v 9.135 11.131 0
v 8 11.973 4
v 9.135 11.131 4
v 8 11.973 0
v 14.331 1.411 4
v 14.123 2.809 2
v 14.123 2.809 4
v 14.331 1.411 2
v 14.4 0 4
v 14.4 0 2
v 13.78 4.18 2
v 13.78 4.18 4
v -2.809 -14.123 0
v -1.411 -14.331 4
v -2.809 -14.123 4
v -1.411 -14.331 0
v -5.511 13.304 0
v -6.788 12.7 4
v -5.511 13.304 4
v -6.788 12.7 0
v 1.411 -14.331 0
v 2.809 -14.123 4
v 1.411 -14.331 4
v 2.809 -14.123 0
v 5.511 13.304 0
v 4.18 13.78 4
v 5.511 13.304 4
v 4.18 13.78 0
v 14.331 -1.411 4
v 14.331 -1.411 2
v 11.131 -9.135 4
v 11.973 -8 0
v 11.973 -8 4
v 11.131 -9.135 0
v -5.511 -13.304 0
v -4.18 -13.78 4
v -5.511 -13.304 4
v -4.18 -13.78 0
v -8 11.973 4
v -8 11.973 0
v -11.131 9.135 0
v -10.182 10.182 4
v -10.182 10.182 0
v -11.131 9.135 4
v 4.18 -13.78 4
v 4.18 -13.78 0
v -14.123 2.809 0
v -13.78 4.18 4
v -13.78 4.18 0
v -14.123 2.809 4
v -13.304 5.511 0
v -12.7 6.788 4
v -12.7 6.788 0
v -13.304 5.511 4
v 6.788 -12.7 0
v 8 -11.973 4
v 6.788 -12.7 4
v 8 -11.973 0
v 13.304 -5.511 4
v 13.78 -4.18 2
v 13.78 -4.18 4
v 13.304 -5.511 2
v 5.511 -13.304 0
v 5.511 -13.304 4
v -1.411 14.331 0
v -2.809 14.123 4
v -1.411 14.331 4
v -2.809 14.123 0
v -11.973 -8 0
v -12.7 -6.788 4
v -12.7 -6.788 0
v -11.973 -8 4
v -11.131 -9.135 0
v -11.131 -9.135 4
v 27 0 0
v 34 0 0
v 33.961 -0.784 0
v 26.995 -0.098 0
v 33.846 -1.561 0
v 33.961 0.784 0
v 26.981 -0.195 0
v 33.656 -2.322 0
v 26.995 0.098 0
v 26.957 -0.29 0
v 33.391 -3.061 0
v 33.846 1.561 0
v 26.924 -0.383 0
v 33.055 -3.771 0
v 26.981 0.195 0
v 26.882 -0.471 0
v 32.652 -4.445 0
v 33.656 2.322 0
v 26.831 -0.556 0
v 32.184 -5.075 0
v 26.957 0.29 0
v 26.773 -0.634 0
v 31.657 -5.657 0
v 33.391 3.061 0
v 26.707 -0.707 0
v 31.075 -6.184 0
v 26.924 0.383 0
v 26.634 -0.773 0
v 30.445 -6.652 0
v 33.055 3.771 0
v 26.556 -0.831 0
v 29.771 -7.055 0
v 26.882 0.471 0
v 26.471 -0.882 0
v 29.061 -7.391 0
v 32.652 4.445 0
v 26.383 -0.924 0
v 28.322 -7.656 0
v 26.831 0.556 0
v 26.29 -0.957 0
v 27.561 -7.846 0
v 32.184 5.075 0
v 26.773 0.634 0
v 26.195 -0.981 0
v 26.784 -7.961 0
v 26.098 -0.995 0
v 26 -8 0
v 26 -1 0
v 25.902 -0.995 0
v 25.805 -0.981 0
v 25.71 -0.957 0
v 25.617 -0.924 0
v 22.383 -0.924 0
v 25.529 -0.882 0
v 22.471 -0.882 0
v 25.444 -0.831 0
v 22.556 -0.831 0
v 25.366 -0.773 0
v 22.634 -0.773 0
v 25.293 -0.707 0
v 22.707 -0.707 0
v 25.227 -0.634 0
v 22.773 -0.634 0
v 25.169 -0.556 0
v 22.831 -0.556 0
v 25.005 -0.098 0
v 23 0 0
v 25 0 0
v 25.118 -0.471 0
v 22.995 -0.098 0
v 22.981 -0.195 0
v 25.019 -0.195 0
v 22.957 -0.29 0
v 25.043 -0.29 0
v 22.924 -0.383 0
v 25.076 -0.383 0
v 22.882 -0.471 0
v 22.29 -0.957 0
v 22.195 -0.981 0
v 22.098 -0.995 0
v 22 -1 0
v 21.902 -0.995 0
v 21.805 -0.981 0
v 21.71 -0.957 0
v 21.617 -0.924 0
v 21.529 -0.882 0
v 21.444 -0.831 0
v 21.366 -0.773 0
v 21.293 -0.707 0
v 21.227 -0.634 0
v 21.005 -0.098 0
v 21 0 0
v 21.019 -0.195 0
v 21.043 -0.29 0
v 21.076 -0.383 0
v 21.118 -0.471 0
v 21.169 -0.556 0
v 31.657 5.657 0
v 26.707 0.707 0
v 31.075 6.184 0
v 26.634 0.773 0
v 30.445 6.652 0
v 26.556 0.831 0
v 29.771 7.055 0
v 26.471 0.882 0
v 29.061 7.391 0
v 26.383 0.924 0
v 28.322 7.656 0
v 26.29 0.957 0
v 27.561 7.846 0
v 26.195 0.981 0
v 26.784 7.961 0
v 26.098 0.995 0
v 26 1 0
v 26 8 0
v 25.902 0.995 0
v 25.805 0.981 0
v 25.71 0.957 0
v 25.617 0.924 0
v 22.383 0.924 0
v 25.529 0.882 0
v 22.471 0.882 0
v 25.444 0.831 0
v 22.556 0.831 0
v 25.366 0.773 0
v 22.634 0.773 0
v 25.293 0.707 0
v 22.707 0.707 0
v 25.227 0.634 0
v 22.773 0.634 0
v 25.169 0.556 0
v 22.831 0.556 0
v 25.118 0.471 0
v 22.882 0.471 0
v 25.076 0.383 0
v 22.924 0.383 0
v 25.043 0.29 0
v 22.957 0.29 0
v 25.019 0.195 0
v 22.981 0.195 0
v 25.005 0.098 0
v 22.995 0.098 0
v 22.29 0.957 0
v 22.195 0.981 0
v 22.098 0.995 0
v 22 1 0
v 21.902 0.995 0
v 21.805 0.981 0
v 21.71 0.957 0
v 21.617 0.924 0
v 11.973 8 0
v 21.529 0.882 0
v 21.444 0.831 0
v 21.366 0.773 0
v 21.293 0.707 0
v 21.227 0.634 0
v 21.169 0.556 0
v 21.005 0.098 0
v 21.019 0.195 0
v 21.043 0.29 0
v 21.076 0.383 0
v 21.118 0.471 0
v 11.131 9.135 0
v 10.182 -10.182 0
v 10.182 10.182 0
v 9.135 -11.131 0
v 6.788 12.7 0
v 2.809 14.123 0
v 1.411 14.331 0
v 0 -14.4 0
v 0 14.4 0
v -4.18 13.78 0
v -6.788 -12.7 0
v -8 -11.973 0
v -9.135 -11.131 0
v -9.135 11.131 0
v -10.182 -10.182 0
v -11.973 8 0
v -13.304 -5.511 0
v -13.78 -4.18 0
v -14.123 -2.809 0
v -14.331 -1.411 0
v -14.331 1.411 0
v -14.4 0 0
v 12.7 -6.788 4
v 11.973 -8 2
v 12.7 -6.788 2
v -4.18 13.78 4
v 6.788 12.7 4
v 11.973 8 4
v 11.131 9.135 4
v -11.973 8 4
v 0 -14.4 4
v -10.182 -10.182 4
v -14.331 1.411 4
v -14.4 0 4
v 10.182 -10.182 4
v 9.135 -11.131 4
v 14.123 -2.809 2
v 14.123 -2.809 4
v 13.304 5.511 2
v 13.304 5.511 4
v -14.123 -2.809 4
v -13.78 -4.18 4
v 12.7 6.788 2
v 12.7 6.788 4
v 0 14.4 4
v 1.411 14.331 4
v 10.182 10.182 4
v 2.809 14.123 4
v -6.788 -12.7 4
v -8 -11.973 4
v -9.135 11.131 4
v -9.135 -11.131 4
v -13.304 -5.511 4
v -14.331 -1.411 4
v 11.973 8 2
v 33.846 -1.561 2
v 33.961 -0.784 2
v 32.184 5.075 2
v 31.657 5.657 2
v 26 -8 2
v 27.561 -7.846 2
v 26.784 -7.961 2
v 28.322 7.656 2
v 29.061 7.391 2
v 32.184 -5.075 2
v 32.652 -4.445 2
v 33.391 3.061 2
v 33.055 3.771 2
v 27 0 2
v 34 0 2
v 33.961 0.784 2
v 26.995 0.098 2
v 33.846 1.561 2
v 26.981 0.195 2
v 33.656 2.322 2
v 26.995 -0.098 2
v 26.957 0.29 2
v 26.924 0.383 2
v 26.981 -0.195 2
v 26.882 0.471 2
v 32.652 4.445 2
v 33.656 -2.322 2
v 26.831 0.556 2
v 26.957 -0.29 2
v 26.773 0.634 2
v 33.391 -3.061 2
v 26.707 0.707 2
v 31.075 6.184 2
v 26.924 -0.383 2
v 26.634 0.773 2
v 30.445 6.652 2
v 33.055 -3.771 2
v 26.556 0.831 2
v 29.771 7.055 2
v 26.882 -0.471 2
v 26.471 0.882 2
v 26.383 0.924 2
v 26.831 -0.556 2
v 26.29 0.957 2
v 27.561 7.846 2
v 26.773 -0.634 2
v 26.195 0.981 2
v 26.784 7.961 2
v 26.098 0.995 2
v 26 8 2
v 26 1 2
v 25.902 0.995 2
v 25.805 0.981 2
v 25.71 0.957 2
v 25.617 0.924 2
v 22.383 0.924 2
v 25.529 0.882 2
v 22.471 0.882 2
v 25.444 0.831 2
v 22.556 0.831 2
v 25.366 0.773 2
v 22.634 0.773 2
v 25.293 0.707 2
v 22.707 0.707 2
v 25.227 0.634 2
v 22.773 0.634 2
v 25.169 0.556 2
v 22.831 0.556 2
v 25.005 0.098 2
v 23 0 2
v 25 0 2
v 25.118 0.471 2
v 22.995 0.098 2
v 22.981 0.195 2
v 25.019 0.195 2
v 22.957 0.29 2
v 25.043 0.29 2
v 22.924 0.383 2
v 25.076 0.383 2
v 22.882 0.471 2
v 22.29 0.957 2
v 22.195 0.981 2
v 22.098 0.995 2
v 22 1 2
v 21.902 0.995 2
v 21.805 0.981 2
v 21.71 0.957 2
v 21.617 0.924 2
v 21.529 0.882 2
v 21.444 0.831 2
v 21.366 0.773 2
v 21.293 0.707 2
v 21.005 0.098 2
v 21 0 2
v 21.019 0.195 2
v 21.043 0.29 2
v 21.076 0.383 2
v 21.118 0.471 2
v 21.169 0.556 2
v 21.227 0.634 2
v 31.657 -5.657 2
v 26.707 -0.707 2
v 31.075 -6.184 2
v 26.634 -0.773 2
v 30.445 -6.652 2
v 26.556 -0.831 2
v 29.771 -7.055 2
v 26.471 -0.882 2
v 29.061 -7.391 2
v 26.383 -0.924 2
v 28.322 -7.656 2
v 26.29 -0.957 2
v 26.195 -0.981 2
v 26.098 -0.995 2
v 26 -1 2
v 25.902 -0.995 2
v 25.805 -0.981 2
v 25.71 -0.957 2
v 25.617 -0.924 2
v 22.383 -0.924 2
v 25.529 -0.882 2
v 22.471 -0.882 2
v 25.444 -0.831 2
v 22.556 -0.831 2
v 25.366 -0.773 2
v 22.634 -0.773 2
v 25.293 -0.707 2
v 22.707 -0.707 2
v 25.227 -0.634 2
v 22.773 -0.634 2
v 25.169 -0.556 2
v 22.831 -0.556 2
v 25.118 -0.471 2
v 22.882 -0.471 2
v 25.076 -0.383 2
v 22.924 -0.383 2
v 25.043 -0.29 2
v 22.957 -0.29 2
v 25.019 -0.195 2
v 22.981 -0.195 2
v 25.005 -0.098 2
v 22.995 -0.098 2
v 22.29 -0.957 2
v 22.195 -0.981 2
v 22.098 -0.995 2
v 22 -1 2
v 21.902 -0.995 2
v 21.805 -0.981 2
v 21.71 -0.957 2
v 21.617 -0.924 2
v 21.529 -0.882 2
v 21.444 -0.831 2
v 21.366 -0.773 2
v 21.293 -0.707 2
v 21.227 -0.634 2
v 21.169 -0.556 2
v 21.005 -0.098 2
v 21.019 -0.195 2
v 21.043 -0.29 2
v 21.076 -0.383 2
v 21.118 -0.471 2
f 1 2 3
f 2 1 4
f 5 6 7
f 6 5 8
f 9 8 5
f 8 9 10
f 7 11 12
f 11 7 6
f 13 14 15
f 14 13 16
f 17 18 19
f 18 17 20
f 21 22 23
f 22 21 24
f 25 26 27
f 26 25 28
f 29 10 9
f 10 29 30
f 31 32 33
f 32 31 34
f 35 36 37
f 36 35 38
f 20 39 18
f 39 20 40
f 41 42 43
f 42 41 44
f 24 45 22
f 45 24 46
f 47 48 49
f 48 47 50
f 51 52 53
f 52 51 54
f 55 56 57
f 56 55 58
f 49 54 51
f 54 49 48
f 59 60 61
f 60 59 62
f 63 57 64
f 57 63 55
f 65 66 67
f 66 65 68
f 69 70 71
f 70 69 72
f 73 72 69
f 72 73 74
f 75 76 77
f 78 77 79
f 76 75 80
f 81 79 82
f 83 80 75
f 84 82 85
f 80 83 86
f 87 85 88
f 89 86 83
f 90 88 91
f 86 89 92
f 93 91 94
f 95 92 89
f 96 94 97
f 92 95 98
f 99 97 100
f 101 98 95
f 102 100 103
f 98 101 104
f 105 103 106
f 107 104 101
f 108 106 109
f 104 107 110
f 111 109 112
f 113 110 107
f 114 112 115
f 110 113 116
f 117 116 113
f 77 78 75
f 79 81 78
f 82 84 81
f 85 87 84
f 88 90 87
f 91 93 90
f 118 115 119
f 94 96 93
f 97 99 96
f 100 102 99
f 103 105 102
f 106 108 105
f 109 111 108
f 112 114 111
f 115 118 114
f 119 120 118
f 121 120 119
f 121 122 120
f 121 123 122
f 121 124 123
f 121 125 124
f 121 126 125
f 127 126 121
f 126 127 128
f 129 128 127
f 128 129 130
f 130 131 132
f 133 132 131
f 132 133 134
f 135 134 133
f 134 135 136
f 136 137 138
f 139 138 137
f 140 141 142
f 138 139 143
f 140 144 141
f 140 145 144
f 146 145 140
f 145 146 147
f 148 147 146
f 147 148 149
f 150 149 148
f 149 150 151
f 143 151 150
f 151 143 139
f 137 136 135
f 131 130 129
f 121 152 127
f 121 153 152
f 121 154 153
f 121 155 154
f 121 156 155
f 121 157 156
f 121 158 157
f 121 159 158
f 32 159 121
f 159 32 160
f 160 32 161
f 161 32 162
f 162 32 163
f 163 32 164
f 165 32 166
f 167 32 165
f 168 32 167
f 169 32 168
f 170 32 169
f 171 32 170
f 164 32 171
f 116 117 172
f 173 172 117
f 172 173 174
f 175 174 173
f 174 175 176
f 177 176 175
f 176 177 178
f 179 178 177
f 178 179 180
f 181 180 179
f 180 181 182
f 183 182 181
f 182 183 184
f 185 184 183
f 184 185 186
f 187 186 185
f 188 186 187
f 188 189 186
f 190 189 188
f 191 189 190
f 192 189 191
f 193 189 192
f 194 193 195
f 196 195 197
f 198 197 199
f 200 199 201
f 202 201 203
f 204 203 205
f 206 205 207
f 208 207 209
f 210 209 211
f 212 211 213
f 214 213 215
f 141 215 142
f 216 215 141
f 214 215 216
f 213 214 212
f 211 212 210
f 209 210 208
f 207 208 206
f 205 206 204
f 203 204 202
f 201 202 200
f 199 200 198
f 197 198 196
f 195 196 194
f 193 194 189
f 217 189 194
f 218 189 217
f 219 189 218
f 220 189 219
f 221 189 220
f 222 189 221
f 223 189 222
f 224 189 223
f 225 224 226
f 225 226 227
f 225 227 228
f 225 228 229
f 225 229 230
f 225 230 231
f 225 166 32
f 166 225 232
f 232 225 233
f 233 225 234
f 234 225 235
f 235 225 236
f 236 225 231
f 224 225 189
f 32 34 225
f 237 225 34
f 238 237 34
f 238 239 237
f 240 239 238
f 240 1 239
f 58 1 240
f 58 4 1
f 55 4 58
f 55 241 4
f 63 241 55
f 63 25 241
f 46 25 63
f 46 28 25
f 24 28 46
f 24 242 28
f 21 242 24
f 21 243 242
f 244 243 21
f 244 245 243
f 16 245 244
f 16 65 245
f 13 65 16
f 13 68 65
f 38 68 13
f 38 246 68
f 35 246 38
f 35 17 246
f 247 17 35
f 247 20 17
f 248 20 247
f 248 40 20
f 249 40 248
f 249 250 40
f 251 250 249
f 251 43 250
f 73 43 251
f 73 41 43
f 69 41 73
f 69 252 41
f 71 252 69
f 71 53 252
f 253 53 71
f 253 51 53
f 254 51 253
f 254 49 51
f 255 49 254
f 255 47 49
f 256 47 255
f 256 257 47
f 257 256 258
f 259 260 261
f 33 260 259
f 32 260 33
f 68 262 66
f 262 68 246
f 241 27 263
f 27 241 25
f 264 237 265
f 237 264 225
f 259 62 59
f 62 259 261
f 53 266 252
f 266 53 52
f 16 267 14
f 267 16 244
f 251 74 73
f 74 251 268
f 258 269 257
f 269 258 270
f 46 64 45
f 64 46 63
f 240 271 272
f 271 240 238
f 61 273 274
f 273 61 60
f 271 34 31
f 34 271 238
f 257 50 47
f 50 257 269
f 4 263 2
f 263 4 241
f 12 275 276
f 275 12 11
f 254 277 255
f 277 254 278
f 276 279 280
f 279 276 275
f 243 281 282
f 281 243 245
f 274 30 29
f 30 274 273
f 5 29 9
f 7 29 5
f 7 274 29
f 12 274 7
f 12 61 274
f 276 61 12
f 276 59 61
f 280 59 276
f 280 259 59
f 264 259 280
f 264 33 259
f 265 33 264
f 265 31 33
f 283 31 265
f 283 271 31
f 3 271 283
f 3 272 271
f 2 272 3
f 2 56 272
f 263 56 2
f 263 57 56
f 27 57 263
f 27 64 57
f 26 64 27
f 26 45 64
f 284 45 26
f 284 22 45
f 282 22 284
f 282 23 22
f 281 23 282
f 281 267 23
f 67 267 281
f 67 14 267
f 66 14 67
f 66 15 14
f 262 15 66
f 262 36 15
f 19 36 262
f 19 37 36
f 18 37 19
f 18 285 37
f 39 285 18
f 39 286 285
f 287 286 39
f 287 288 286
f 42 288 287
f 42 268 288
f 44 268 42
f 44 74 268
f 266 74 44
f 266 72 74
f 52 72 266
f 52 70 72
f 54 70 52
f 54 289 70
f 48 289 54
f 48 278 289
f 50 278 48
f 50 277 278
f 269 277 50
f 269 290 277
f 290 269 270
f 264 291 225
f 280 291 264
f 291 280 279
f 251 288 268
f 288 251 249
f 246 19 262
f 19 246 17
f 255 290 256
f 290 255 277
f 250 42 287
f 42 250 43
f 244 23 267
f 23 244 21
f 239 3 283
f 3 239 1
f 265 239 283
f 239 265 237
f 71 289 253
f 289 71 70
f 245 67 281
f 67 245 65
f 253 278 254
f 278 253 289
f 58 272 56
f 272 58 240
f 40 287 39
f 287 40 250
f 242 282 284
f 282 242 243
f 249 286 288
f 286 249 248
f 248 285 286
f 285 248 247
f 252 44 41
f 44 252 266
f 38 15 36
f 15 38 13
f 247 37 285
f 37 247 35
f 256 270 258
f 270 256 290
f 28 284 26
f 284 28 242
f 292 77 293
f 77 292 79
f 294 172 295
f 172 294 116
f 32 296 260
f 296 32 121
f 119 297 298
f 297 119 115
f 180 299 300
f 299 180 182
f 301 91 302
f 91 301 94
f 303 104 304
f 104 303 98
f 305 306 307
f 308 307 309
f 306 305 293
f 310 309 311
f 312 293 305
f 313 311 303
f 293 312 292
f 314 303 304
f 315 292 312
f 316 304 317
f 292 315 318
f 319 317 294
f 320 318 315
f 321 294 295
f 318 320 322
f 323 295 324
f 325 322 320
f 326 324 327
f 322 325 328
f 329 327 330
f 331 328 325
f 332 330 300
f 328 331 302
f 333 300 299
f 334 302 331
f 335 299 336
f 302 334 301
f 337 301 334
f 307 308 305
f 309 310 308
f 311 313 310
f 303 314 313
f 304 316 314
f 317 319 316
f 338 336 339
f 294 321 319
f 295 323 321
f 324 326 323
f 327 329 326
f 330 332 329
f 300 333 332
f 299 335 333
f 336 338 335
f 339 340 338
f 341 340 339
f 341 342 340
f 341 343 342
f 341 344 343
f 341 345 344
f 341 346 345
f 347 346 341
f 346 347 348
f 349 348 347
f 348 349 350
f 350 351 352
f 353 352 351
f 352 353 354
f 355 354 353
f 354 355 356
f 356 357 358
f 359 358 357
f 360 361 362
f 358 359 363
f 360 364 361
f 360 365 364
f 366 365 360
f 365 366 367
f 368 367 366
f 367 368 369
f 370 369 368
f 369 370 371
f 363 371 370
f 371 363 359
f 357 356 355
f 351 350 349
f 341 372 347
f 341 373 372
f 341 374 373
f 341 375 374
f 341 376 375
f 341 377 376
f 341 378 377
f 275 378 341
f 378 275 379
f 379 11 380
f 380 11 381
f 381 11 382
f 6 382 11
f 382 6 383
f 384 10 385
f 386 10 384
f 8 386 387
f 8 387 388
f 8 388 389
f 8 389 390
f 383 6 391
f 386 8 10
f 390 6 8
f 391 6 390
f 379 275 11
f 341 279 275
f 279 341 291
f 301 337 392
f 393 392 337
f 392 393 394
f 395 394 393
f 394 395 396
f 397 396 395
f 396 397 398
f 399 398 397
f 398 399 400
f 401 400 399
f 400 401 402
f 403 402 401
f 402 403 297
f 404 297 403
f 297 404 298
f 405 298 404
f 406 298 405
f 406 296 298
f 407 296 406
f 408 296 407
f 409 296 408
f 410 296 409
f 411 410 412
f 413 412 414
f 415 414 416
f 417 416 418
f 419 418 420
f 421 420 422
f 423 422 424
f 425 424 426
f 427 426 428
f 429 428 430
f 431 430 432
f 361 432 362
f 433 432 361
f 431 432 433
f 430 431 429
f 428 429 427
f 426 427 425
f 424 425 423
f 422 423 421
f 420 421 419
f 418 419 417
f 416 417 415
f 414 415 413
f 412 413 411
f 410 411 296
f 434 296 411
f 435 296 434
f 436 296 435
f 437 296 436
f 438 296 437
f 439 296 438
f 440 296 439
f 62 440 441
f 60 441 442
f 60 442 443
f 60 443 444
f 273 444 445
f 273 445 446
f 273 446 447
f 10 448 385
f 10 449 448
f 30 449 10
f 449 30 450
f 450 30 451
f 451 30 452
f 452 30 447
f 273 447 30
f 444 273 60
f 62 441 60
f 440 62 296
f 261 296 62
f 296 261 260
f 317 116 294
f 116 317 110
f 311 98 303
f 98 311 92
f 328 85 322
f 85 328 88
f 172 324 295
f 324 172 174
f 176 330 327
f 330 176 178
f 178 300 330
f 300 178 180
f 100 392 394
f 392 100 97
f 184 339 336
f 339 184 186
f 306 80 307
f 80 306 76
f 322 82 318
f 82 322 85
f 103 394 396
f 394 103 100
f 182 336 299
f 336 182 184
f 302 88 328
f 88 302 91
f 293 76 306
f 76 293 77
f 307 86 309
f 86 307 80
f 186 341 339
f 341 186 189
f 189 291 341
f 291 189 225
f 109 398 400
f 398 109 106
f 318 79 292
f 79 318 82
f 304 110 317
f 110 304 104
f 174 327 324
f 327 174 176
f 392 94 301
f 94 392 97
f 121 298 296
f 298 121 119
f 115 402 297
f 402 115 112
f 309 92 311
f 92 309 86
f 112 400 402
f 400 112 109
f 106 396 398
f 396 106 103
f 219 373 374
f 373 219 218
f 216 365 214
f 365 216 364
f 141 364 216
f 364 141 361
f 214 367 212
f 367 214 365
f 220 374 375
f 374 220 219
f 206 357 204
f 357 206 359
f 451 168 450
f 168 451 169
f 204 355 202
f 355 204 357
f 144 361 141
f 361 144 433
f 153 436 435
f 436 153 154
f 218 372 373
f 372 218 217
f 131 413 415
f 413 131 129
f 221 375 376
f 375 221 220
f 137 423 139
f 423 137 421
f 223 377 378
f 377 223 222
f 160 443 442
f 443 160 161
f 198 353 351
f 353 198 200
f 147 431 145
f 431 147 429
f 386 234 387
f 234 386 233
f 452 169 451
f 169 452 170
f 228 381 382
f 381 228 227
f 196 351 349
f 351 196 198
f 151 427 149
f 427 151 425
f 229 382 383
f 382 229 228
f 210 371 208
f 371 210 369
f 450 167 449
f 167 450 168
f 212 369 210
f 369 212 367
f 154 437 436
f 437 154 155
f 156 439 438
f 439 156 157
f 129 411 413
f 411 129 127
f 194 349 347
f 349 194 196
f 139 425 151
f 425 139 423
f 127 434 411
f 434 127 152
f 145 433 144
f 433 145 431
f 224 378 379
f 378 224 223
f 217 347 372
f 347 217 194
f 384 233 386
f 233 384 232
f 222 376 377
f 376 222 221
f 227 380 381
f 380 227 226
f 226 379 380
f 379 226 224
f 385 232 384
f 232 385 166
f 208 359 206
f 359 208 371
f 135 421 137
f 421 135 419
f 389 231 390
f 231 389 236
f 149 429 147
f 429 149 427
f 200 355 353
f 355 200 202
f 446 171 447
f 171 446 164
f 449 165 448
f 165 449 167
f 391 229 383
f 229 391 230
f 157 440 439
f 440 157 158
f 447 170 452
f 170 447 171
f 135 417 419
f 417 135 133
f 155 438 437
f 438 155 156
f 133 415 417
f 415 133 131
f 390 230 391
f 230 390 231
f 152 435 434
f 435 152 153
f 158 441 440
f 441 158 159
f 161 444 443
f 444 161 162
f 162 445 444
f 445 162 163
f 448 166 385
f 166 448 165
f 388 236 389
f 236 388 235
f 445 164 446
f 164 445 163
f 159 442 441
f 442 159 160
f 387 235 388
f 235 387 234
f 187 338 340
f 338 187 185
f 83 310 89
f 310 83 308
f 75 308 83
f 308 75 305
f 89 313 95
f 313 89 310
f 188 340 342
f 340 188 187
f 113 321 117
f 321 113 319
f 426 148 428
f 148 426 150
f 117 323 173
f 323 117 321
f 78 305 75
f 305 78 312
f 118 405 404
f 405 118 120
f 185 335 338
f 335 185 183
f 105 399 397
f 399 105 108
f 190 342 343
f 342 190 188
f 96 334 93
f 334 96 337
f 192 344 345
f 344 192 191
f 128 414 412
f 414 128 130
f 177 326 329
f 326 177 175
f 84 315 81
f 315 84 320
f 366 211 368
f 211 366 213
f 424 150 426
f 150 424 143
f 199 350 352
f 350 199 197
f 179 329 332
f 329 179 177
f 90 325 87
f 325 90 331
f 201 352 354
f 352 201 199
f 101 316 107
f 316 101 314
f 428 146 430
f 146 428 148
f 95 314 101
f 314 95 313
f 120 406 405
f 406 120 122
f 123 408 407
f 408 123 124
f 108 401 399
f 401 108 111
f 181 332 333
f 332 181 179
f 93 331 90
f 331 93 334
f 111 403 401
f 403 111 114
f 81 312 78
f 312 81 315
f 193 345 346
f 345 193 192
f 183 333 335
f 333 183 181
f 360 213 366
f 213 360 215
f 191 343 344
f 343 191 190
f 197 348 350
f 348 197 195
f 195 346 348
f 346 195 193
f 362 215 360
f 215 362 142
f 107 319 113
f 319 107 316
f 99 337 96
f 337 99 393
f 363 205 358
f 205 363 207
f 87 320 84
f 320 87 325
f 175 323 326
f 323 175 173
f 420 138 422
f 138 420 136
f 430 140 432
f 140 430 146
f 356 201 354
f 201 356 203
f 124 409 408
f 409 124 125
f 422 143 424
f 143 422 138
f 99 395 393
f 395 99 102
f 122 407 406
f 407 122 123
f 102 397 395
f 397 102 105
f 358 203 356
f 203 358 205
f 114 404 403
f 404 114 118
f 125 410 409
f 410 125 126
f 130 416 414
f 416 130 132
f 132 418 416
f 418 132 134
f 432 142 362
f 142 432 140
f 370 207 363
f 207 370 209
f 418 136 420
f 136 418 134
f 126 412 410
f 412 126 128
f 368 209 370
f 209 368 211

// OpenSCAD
// Box to house the controller on the side of the kettle


//%kettle_shape();
controller_case();
display_inner_plate();
display_outer_plate();
/* translate([0,4,3]) kettle_wire_clamp();
translate([0,7.5]) wemos_mount_clip(); */
the_ring_of_power();
!drill_template();
module the_ring_of_power(){
    $fn=64;
    FR = 28-1+4;
    difference() {
        union(){
            //cylinder(d=60-11+2,h=1,center=true);
            cylinder(d=68,h=1,center=true);
            /* for(i=[0:3]) rotate([0,0,360*i/3]) hull() for(j=[0:1])
                translate([FR*j,0]) cylinder(d=6,h=1,center=true); */
        }
        cylinder(d=34,h=2,center=true);

        for(i=[0:3]) rotate([0,0,360*i/3]) translate([FR,0]) cylinder(d=2.8,h=2,center=true);

        translate([0,0,0.3]){
            //cylinder(r=17+1,h=1);
            difference() {
                R=21-1;
                W=0.6;
                cylinder(r=R+.5*W,h=1);
                cylinder(r=R-.5*W,h=3,center=true);
            }
            difference() {
                R=21+3;
                W=0.6;
                cylinder(r=R+.5*W,h=1);
                cylinder(r=R-.5*W,h=3,center=true);
            }
            difference() {
                R=25.1+3;
                W=0.7;
                cylinder(r=R+.5*W,h=1);
                cylinder(r=R-.5*W,h=3,center=true);
            }
        }
    }
}

module drill_template(){
    $fn=64;
    difference() {
        union(){
            cylinder(d=28.8,h=4);
            hull() for(i=[0:1]) translate([26*i,0]) cylinder(d=16,h=2);
        }
        translate([22,0]) cylinder(d=2,h=5,center=true);
        translate([26,0]) cylinder(d=2,h=5,center=true);
    }
}

module kettle_shape(){
    cylinder(d1=157.5,d2=132+10*0,h=224,$fn=128);
    translate([0,0,29]) rotate([90,0]) cylinder(d=27,h=80);
    hull() for(i=[-.5:1:.5]) translate([50*i,0,29])
        rotate([90,0]) cylinder(d=11,h=80);
}

module controller_case(){
    $fn=32;
    difference(){
        union(){
            difference(){
                /* hull() for(i=[-.5:1:.5],j=[0:1]) translate([60*i,-58,8+60*j])
                    rotate([90,0]) cylinder(d=16,h=38); */
                hull() for(i=[-.5:1:.5],j=[0:1]) translate([(60+5*0)*i,-58,8+60*j])
                    rotate([90,0]) cylinder(d=16,h=38);
                translate([0,0,-1]) kettle_shape();
                hull() for(i=[-.5:1:.5],j=[0:1]) translate([60*i,-58,8+60*j])
                    rotate([90,0]) cylinder(d=16-4,h=22+16-2+10*0);
            }

            // display screw nub
            for(i=[-.5:1:.5]) translate([0,-96+1,62+17*i])
                rotate([-90,0]) cylinder(d=6,h=2.75);
            hull() for(i=[-.5:1:.5],j=[-.5:1:.5]) translate([(38.5-.2)*i+1,-58-36,62+(13-.2)*j])
                rotate([-90,0]) cylinder(r=3,h=1.75);
            // wemos screw nubs
            color([.4,.4,.8]) hull() for(j=[-.5:1:.5],i=[-.5:1:.5]) translate([-14+38*j,-96+2,26-1+(36+6)*i])
                rotate([-90,0]) cylinder(d=6,h=4+1+2*0);
            // touch sensor nubs
            color([.4,.4,.8]) for(i=[-.5:1:.5]) translate([23,-96+1,40+20*i])
                rotate([-90,0]) cylinder(d=6,h=4-1.9);
            hull() for(i=[-.5:1:.5],j=[-.5:1:.5]) translate([20.5*i+23,-58-36,40+13*j])
                rotate([-90,0]) cylinder(r=4,h=2-1);
            // kettle connector nubs
            color([.4,.4,.8]) for(i=[-.5:1:.5])hull() for(j=[-.5:1:.5]) translate([23+18*i,-96+1,18+10*j])
                rotate([-90,0]) cylinder(d=6,h=4);
            color([.4,.4,.8]) hull() for(i=[-.5:1:.5],j=[-.5:1:.5]) translate([23-3+(18+10)*i,-96+1,18+10*j])
                rotate([-90,0]) cylinder(d=6,h=2.75);
        }


        color([.6,.2,.9]) translate([0,0,62]){ // OLED
            hull() for(i=[-.5:1:.5],j=[-.5:1:.5]) translate([(26-1)*i,-58,(10-1)*j+.2])
                rotate([90,0]) cylinder(d=1,h=22+16+1);
            hull() for(i=[-.5:1:.5],j=[-.5:1:.5]) translate([(38.5-.2)*i+1,-58,(13-.7)*j])
                rotate([90,0]) cylinder(d=.2,h=22+16-1);
        }

        color([.6,.2,.9]) translate([-14,-3+2,26]){ // WEMOS-32
            /* hull() for(i=[-.5:1:.5],j=[-.5:1:.5]) translate([(26-1)*i,-58,(10-1)*j])
                rotate([90,0]) cylinder(d=1,h=22+16+1); */
            hull() for(i=[-.5:1:.5],j=[-.5:1:.5]) translate([(32-2)*i,-58,(40-2)*j])
                rotate([90,0]) cylinder(d=2,h=22+16-4);

            hull() for(i=[-.5:1:.5],j=[-.5:1:.5]) translate([(11-1)*i,-58-32+(7-1)*j,-8]) //USB
                rotate([180,0]) cylinder(d=1,h=22+16+1);
        }

        color([.6,.2,.9]) translate([23,0,40]){ // touch sensor
            hull() for(i=[-.5:1:.5],j=[-.5:1:.5]) translate([20.5*i,-58-1.1,13*j])
                rotate([90,0]) cylinder(r=.4,h=22+16-2);
        }

        translate([21,-38-58,40]){
            difference(){ // touch sensor panel button
                hull() for(i=[-.5:1:.5],j=[-.5:1:.5]) translate([10*i,0,10*j])
                    rotate([90,0]) cylinder(r=3.2,h=1,center=true);
                hull() for(i=[-.5:1:.5],j=[-.5:1:.5]) translate([10*i,0,10*j])
                    rotate([90,0]) cylinder(r=2.4,h=2,center=true);
            }
            /* translate([0,0,0]) rotate([90,0]) linear_extrude(height=1,center=true)
                text("Run", size=6, font="Tlwg Typo:style=Bold", halign="center", valign="center",
                    spacing=1.0); */
            hull() for(i=[0:1]) translate([0,0,6*i])
                rotate([90,0]) cylinder(d=1.2,h=1,center=true);

            rotate([90,0]) difference(){
                R = 6;
                lw = 1.2;
                cylinder(r=R,h=1,center=true);
                cylinder(r=R-lw,h=1,center=true);
                hull() for(i=[-.5:1:.5]) translate([0,3*i+R-lw])
                    cylinder(d=3,h=1,center=true);
            }
        }

        fd = 1.8; // fastener diameter
        // display screw nub
        color([.4,.4,.8]) for(i=[-.5:1:.5]) translate([0,-96+1,62+17*i])
            rotate([-90,0]) cylinder(d=fd,h=5);
        // wemos screw nubs
        #color([.4,.4,.8]) for(i=[-.5:1:.5],j=[-.5:1:.5]) translate([-14+38*j,-96+1,26+36*i])
            rotate([-90,0]) cylinder(d=fd,h=5+2*0+5);
        // touch sensor nubs
        color([.4,.4,.8]) for(i=[-.5:1:.5]) translate([23,-96+1,40+20*i])
            rotate([-90,0]) cylinder(d=fd,h=5);
        // touch sensor nubs
        color([.4,.4,.8]) for(i=[-.5:1:.5],j=[-.5:1:.5]) translate([23+18*i,-96+1,18+10*j])
            rotate([-90,0]) cylinder(d=fd,h=5);

        translate([0,-59.25]) rotate([atan(0.5*((132-157.5+8)/132)),0]) cube([200,20,200],center=true);

        // self-tapping M2.3x8mm screws:
        translate([0,-74]) rotate([atan(0.5*((132-157.5+8)/132)),0]) for(i=[-.5:1:.5],j=[0:2]) translate([70*i,0,10+27*j]){
            rotate([0,90,15*i]) cylinder(d=2.35,h=16,center=true);
            rotate([0,180*i,15*i]) translate([0,0,2.75]) cylinder(d=4,h=16); // head
        }
    }
}

module kettle_wire_clamp(){
    $fn=32;
    difference() {
        union(){
            color([.4,.4,.8]) hull() for(i=[-.5:1:.5],j=[-.5:1:.5]) translate([23+18*i,-96+1,15+10*j])
                rotate([-90,0]) cylinder(d=6,h=2);

        }
        for(i=[-.5:1:.5],j=[-.5:1:.5]) translate([23+18*i,-96+1,15+10*j])
            rotate([-90,0]) cylinder(d=2.3,h=4);
        hull() for(i=[-.5:1:.5]) translate([23+11*i,-96+0.5,15]) cylinder(d=2,h=20,center=true);
        hull() for(i=[-.5:1:.5]) translate([23+10*i,-96+0.5,17]) rotate([90,0,0]) cylinder(d=4,h=20,center=true);
    }
}


module wemos_mount_clip(){
    $fn=32;
    difference() {
        union(){
            color([.6,.6,.8]) for(i=[-.5:1:.5]) hull() for(j=[-.5:1:.5]) translate([-14+38*j,-96+1,26+36*i])
                rotate([-90,0]) cylinder(d=6,h=2);
            color([.6,.6,.8]) hull() for(i=[-.5:1:.5]) translate([-14,-96+1,26+36*i])
                rotate([-90,0]) cylinder(d=4,h=2);
        }

        for(j=[-.5:1:.5],i=[-.5:1:.5]) translate([-14+38*j,-96,26+36*i])
            rotate([-90,0]) cylinder(d=2.4,h=4+2*0);
    }
}

module display_inner_plate(){
    $fn=32;
    difference() {
        union(){
            intersection(){ // bit that goes through the hole
                union(){
                    ll = 80;
                    translate([0,0,29]) rotate([90,0]) cylinder(d=27,h=ll);
                    hull() for(i=[-.5:1:.5]) translate([50*i,0,29])
                        rotate([90,0]) cylinder(d=11,h=ll);
                }
                difference() { // kettle surface
                    wt = 1;
                    cylinder(d1=156.5+wt,d2=131+wt,h=224,$fn=128);
                    cylinder(d1=156.5-wt,d2=131-wt,h=224,$fn=128);
                }
            }

            intersection(){ // inner surface
                union(){
                    ll = 80;
                    translate([0,0,29]) rotate([90,0]) cylinder(d=31,h=ll);
                    hull() for(i=[-.5:1:.5],j=[0:1]) translate([50*i+14*i*j,0,29-j*(8+7)])
                        rotate([90,0]) cylinder(d=15-14*j,h=ll);
                }
                difference() { // kettle surface
                    wt = 3;
                    cylinder(d1=156.5,d2=131,h=224,$fn=128);
                    cylinder(d1=156.5-2*wt,d2=131-2*wt,h=224,$fn=128);
                }
            }

        }
        translate([0,0,29]) rotate([90,0]) cylinder(d=27-5,h=80);
        for(i=[-1:2:1],j=[0:1]) translate([(25-10*j)*i,0,29])
            rotate([90,0]) cylinder(d=1.8,h=90);
        //#cylinder(r=100,h=21.5);
    }
}

module display_outer_plate(){
    $fn=32;
    difference() {
        union(){
            intersection(){ // outer surface
                union(){
                    hull() for(i=[-.5:1:.5],j=[0:1]) translate([60*i,-58,8+60*j])
                        rotate([90,0]) cylinder(d=12-.8,h=22+16-2+10*0);
                }
                difference() { // kettle surface
                    wt = 2;
                    cylinder(d1=157.5+2*wt,d2=132+2*wt,h=224,$fn=128);
                    cylinder(d1=157.5,d2=132,h=224,$fn=128);
                }
            }

            intersection(){ // fastener mounting blocks
                intersection(){
                    hull() for(i=[-.5:1:.5]) translate([70*i,-72,2])
                        rotate([atan(0.5*((132-157.5+8)/132)),0]) translate([0,0,-1]) cylinder(d=10,h=73);
                    hull() for(i=[-.5:1:.5],j=[0:1]) translate([60*i,-58,8+60*j])
                        rotate([90,0]) cylinder(d=12-.8,h=22+16-2+10*0);
                }
                /* difference() { // kettle surface
                    wt = 5;
                    cylinder(d1=157.5+2*wt,d2=132+2*wt,h=224,$fn=128);
                    cylinder(d1=157.5,d2=132,h=224,$fn=128);
                } */
                rotate([atan(0.5*((132-157.5+8)/132)),0]) cube([100,152,200],center=true);
            }
        }
        translate([0,0,29]) rotate([90,0]) cylinder(d=27-5,h=90);
        cylinder(d1=157.5,d2=132,h=224,$fn=128);
        //#cylinder(r=100,h=21.5);
        for(i=[-1:2:1],j=[0:1]) translate([(25-10*j)*i,0,29])
            rotate([90,0]) cylinder(d=2.3,h=90);

        hull() for(i=[-.5:1:.5],j=[0:1]) translate([(30+20*j)*i,-58,50+30*j])
            rotate([90,0]) cylinder(d=12-.8,h=22+16-2+10*0);

        // self-tapping M2.3x8mm screws:
        translate([0,-74]) rotate([atan(0.5*((132-157.5+8)/132)),0]) for(i=[-.5:1:.5],j=[0:2])
            translate([70*i,0,10+27*j]) rotate([0,90,15*i]) cylinder(d=1.8,h=16,center=true);
    }
}
